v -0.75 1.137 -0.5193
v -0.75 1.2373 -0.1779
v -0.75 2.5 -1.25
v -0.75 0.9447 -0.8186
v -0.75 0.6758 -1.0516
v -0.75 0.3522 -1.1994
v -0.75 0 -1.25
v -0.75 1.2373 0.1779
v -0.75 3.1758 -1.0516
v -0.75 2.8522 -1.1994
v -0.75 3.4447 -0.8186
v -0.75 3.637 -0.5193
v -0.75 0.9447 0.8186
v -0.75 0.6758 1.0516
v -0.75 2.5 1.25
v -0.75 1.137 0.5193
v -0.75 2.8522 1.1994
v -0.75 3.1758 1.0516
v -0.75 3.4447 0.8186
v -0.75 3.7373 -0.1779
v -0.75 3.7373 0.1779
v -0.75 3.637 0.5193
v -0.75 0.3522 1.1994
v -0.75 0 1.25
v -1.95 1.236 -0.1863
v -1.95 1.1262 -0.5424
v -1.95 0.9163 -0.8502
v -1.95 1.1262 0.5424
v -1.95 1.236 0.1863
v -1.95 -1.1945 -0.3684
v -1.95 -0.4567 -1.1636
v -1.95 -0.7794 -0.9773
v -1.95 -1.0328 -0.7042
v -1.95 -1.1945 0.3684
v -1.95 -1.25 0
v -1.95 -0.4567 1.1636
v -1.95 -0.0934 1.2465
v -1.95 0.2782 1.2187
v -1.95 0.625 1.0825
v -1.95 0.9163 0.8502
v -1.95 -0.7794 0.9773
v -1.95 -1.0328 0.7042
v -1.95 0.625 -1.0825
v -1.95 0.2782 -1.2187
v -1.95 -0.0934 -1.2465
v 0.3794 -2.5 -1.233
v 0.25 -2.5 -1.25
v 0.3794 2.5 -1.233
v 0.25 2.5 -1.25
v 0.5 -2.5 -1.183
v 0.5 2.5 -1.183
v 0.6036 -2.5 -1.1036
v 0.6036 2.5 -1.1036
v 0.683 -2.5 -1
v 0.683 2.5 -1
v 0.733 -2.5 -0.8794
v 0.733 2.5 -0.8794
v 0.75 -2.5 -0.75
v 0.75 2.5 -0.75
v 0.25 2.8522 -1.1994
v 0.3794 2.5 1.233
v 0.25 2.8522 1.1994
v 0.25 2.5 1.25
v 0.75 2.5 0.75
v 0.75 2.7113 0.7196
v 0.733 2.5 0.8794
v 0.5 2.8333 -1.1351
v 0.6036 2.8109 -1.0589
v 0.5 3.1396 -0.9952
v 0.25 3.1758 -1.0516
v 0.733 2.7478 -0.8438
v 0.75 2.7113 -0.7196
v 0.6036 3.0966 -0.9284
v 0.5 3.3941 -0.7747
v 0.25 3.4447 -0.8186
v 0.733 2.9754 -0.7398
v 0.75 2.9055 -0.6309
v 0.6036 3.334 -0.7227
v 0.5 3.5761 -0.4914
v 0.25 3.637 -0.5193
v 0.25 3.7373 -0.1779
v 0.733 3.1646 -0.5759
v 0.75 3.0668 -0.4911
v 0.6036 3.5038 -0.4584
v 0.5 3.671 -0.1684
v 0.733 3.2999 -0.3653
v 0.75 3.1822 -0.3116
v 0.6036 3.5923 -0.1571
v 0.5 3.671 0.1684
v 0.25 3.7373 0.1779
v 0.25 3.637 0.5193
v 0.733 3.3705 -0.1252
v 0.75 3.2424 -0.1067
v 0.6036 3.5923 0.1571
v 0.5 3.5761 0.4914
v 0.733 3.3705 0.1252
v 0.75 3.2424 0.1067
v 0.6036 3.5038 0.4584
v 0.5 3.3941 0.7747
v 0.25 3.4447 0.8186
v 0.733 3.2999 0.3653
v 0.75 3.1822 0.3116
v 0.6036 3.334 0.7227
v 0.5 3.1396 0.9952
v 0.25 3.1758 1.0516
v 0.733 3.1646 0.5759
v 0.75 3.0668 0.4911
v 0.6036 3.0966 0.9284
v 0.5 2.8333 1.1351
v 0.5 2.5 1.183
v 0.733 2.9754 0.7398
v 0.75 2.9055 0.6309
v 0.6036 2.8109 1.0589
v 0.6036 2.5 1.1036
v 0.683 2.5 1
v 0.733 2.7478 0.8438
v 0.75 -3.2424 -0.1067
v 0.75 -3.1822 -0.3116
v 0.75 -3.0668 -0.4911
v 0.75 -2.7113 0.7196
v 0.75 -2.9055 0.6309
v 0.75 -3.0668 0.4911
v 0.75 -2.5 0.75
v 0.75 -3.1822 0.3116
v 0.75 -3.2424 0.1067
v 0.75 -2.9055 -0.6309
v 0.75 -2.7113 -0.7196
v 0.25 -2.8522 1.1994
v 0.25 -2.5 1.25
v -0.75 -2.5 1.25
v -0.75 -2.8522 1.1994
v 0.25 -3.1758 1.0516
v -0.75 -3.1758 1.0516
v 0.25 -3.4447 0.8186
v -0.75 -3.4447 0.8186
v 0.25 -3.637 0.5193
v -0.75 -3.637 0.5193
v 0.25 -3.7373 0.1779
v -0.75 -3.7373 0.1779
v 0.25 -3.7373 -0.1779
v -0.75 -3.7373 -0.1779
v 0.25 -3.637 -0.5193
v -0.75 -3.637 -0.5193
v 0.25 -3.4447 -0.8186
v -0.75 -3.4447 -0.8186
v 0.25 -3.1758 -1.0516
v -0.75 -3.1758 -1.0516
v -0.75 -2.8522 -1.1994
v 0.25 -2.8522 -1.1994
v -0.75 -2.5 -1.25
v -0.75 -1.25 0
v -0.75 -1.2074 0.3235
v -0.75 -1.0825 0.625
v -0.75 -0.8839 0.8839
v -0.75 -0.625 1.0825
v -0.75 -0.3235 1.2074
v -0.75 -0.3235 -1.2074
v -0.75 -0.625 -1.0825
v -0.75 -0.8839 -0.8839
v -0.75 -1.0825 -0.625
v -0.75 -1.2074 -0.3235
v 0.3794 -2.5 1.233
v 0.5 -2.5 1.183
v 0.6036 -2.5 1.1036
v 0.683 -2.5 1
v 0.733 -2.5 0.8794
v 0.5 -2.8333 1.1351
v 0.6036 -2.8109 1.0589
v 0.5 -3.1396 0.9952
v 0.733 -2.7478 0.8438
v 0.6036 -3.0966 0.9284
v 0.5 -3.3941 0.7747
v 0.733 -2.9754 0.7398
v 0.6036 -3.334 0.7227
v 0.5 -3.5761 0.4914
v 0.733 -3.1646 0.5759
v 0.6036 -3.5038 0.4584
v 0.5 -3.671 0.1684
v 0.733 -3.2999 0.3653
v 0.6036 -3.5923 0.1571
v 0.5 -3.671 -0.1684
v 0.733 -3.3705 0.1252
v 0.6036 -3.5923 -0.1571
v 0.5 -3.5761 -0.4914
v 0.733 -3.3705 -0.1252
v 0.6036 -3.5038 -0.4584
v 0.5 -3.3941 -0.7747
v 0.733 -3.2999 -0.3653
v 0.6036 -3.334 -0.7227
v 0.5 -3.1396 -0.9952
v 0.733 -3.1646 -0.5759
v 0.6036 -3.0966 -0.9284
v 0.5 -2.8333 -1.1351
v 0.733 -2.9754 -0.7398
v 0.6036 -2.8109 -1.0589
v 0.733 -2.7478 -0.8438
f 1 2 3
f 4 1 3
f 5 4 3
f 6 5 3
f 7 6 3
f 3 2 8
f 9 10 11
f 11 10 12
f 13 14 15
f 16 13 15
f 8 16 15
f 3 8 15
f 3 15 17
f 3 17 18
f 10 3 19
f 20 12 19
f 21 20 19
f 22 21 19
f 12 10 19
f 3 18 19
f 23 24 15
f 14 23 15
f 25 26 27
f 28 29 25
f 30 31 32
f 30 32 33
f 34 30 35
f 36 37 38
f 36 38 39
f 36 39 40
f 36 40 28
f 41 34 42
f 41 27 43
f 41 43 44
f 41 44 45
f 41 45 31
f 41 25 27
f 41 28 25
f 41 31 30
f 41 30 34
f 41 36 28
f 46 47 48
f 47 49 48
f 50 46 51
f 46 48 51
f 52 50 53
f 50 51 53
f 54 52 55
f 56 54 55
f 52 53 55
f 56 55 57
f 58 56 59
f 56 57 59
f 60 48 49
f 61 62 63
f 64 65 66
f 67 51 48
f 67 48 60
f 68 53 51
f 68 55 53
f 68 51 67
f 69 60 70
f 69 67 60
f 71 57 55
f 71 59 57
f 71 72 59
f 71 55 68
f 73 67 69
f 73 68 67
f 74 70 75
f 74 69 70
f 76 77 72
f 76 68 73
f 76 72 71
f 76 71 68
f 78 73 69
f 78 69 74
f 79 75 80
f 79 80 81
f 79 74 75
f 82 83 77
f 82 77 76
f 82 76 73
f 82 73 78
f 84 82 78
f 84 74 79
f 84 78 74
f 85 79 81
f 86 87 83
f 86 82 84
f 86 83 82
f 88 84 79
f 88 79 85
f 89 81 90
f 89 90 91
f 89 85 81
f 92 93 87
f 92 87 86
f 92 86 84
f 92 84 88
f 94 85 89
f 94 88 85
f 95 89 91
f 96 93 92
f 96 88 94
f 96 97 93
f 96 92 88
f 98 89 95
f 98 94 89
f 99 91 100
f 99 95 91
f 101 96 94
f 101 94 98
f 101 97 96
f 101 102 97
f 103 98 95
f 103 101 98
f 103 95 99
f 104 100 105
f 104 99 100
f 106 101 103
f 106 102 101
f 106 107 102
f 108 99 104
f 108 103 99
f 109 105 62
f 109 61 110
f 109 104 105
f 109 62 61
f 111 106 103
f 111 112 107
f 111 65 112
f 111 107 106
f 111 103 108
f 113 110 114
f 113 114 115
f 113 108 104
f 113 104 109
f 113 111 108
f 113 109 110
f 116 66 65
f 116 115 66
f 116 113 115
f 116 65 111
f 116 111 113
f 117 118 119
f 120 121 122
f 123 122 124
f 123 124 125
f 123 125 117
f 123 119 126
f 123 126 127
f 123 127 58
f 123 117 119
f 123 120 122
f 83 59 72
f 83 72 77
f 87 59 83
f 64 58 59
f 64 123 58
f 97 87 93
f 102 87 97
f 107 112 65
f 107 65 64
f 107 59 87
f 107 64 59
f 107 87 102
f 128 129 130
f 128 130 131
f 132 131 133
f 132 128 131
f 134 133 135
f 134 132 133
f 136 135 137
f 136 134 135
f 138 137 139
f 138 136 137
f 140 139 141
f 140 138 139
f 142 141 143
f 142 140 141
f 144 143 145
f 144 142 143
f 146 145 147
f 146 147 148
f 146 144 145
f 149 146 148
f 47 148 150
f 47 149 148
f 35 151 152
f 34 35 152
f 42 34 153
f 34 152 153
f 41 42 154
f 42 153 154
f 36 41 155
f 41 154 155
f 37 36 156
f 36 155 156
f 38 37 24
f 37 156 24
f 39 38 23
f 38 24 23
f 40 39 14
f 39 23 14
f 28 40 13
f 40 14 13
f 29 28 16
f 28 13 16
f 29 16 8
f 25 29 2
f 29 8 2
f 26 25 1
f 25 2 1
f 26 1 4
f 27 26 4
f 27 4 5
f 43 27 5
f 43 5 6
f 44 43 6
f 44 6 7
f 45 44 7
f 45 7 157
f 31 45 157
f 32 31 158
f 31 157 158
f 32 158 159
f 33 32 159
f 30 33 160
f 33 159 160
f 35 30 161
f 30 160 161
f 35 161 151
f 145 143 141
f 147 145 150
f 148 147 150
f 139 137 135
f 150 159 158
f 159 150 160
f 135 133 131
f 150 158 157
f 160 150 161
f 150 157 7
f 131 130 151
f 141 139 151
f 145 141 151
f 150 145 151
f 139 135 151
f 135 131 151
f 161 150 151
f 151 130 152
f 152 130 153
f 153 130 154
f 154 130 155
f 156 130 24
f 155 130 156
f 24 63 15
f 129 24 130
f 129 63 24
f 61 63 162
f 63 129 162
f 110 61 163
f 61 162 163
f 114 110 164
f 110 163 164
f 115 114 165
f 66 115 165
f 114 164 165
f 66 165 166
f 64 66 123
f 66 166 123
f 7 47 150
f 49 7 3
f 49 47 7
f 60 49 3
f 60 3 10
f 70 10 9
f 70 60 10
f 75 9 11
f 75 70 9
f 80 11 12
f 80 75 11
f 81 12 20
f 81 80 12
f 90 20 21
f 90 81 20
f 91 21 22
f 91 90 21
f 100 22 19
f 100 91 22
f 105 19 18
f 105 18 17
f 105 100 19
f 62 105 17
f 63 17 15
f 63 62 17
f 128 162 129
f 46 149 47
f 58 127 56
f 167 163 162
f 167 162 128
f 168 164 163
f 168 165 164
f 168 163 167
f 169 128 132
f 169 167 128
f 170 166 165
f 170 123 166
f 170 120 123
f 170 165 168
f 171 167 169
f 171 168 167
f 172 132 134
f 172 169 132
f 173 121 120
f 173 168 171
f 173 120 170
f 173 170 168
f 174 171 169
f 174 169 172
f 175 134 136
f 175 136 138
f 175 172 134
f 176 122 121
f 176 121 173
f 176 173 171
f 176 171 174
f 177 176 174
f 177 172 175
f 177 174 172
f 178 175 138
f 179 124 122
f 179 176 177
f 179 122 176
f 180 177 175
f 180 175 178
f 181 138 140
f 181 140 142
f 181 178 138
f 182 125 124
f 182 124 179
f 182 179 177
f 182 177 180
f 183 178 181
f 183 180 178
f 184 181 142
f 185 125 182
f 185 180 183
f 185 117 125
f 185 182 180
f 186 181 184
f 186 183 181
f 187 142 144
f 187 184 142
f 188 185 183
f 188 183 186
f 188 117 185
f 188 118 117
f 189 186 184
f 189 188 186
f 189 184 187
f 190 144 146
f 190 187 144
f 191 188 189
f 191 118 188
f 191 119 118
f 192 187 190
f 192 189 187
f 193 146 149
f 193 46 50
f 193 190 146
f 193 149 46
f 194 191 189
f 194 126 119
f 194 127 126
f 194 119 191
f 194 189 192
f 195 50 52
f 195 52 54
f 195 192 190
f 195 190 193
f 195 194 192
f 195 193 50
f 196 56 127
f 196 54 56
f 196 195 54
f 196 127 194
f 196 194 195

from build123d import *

# Parameters (mm, degrees)
F1_DEPTH = 0.75
F2_R     = 0.5
F3_R     = 1.25
F4_DEPTH = 1.2


with BuildPart() as f1:
    # F0 (on Right) → F1 (new body, symmetric)
    with BuildSketch(Plane.YZ):
        with BuildLine():
            Line((2.5, 1.25), (-2.5, 1.25))
            ThreePointArc((-2.5, 1.25), (-3.75, 0), (-2.5, -1.25))
            Line((-2.5, -1.25), (2.5, -1.25))
            ThreePointArc((2.5, -1.25), (3.75, 0), (2.5, 1.25))
        make_face()
    extrude(amount=F1_DEPTH, both=True)

    # F2
    f2_edges = [f1.edges().sort_by_distance(p)[0] for p in [
        (0.75, 0, 1.25),
        (0.75, -3.75, 0),
        (0.75, 0, -1.25),
        (0.75, 3.75, 0),
    ]]
    fillet(f2_edges, radius=F2_R)

    # F3 (on face) → F4 (join)
    with BuildSketch(Plane(origin=(-0.75, 0, 0), x_dir=(0, -1, 0), z_dir=(-1, 0, 0))):
        Circle(F3_R)
    extrude(amount=F4_DEPTH)


solid = f1.part
